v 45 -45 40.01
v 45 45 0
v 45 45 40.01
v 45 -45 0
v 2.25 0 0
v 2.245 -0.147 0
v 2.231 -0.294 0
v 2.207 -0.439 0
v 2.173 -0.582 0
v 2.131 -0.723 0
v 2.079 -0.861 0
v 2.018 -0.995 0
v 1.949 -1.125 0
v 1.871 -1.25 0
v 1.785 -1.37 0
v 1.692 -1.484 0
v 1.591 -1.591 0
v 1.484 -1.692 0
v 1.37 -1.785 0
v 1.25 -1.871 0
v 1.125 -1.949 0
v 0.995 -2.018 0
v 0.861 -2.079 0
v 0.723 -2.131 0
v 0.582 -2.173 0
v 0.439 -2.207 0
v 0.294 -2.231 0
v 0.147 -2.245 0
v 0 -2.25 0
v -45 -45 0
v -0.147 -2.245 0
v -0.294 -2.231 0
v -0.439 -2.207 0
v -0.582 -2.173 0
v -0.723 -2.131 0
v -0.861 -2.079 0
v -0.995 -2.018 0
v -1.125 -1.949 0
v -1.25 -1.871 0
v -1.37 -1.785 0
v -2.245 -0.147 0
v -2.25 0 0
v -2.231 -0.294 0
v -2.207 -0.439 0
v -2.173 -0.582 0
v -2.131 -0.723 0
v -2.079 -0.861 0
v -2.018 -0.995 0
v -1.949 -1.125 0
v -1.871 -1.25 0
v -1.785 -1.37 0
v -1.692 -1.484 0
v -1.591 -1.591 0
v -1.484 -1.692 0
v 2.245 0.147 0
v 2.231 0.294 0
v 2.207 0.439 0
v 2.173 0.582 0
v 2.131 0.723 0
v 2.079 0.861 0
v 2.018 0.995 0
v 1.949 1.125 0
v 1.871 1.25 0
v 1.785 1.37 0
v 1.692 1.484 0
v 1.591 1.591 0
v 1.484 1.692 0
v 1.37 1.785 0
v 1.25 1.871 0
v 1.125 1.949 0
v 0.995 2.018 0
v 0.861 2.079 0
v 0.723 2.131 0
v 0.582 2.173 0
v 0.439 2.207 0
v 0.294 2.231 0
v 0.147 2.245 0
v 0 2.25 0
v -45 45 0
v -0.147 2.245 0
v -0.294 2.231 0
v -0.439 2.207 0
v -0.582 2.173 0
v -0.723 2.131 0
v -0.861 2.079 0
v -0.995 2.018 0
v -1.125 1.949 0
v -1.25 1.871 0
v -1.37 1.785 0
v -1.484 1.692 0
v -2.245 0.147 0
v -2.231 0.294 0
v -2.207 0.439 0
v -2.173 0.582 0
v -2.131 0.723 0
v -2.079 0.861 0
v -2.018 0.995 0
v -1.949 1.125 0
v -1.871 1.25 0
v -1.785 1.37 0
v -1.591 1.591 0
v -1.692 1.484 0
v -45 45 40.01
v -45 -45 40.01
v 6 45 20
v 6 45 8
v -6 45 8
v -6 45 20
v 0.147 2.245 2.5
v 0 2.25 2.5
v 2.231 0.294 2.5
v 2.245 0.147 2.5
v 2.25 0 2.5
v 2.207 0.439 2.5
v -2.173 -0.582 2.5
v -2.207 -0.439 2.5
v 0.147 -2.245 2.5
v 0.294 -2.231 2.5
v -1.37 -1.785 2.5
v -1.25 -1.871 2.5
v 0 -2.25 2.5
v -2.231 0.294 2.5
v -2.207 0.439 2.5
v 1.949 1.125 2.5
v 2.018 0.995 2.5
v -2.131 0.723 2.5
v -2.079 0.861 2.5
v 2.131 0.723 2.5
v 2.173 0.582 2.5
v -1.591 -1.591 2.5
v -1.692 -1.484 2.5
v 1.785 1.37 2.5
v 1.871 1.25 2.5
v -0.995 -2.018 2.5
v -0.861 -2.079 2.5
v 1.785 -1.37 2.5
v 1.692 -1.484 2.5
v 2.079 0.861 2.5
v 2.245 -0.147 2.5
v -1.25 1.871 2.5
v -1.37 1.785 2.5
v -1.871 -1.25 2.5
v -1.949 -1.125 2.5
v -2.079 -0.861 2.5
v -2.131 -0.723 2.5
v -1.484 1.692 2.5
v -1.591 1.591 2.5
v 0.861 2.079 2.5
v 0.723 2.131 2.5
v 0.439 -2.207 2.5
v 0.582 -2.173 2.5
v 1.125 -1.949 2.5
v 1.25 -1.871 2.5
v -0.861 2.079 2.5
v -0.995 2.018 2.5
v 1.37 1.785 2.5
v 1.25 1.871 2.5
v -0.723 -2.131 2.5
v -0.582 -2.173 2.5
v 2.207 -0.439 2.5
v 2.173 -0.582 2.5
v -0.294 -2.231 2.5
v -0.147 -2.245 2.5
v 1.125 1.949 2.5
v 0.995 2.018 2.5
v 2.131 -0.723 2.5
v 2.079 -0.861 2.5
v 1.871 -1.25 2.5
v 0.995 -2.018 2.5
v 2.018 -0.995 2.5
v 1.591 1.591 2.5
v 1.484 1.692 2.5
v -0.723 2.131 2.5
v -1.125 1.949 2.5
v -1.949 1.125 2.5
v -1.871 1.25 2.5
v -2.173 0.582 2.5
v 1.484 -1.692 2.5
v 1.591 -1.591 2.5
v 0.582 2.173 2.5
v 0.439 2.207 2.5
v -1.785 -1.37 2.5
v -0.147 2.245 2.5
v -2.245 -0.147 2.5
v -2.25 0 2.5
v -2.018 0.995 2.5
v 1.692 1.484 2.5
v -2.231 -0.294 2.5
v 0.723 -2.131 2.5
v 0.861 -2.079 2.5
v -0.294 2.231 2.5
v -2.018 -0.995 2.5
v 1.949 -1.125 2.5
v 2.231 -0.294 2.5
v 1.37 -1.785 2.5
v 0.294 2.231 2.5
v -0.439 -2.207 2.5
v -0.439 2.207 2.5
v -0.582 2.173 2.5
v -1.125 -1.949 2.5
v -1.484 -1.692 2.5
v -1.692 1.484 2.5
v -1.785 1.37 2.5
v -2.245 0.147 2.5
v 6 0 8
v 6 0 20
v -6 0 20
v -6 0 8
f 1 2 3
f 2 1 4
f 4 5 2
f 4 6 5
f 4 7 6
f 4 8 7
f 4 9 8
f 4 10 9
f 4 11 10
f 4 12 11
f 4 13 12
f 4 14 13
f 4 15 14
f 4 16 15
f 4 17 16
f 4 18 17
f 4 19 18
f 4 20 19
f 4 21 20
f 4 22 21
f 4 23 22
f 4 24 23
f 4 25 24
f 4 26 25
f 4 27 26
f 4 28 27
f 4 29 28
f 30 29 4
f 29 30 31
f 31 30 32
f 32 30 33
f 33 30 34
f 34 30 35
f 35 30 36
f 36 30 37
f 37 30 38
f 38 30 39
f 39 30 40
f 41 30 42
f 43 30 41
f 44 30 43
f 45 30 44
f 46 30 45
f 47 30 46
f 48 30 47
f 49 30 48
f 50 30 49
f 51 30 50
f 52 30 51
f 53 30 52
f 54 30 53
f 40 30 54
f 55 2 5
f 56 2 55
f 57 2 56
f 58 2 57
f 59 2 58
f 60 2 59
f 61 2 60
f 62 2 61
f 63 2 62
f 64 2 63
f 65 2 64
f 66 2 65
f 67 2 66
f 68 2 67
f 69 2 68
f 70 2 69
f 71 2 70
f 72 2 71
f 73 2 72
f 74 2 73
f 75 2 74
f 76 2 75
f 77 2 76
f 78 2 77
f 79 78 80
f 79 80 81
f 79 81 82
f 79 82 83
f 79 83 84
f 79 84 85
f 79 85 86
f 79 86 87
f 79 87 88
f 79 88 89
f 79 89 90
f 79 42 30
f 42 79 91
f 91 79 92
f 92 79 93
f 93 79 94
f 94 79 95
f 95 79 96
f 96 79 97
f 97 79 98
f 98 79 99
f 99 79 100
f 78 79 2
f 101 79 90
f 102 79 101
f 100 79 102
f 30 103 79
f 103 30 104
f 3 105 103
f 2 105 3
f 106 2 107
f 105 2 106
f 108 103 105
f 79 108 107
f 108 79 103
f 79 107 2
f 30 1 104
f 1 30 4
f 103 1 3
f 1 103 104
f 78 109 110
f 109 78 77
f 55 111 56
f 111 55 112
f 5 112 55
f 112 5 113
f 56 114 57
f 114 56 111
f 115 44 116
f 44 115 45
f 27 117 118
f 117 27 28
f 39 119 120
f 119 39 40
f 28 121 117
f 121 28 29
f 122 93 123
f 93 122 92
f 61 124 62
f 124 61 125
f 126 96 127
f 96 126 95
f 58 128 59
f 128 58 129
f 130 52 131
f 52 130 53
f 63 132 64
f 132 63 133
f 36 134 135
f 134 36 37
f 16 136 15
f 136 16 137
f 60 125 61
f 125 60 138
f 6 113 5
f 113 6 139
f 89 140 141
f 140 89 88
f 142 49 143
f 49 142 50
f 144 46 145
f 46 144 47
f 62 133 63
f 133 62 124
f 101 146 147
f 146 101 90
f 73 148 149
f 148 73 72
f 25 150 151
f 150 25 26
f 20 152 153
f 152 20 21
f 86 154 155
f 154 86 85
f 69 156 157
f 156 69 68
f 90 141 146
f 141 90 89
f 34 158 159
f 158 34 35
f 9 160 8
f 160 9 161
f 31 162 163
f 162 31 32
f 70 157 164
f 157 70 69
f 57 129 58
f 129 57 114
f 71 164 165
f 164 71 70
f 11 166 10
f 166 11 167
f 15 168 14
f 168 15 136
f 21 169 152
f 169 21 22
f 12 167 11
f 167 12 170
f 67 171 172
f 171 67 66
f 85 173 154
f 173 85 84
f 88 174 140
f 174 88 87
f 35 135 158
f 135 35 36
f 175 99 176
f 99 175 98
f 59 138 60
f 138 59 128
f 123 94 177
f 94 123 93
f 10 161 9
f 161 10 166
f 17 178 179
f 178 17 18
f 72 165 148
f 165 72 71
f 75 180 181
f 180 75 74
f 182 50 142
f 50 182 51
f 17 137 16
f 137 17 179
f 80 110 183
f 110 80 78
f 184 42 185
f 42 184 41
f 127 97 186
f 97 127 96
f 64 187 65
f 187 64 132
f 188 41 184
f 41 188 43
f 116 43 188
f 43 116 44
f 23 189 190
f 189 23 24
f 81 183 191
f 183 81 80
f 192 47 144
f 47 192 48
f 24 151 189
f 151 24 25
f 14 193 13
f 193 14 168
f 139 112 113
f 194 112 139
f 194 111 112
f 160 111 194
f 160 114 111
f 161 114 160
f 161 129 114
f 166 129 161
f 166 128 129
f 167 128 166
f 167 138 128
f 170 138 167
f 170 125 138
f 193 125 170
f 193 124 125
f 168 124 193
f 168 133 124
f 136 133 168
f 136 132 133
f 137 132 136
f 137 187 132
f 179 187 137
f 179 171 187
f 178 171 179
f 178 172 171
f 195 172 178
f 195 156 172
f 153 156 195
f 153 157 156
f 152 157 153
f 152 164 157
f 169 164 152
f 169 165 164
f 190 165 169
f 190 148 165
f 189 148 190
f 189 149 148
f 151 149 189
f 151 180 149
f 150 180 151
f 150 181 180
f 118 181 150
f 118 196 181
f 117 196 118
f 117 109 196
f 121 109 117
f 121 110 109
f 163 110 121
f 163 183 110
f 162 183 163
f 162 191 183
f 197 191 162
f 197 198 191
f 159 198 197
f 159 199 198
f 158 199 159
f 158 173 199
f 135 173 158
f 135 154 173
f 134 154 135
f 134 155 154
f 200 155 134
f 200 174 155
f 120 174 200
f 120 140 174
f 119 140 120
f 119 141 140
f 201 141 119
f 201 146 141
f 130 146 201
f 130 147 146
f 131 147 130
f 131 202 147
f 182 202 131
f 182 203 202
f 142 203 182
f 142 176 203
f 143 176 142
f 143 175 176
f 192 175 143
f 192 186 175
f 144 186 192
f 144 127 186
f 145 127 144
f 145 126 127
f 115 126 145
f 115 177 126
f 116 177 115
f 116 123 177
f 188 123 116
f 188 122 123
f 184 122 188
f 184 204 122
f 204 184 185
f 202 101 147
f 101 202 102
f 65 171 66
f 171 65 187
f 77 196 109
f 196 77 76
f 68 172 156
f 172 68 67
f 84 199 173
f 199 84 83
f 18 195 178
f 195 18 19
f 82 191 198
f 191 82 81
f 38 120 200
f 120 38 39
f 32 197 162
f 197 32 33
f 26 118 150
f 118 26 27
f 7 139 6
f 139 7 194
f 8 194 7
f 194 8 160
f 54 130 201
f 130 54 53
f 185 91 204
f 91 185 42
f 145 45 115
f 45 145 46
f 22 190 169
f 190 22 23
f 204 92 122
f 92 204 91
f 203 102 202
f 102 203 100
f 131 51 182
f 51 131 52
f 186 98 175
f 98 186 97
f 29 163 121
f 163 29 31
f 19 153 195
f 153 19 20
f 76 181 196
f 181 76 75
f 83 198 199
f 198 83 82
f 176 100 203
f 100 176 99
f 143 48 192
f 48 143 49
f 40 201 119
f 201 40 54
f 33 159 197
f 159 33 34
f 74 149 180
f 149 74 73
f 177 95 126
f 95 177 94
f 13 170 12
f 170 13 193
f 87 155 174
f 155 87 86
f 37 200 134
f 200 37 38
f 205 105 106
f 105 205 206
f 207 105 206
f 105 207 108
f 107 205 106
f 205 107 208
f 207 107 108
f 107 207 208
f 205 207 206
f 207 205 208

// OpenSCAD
// Magnetic stirrer housing - open box covering an 80 mm PC case fan
// Print orientation: top plate on bed (z = 0), walls rise to open top (z = 40)

// ---------- Parameters ----------
outer_x      = 90;    // outer size in X (mm)
outer_y      = 90;    // outer size in Y (mm)
plate_t      = 2;     // top plate thickness (mm)
wall_t       = 2.5;   // wall thickness (mm)
open_top_z   = 40;    // height of open top / wall tops (mm)
screw_holes  = 4;     // number of M4 screw holes
screw_d      = 4.5;   // screw hole diameter (mm)
screw_pitch  = 71.5;  // square pattern size for screw holes (mm)
notch_w      = 12;    // power cable notch width (mm)
notch_bottom = 8;     // notch depth from open edge (mm), z = 32..40

eps          = 0.5;   // cutter overshoot past faces (mm)
$fn          = 96;    // curve resolution

// ---------- Model ----------
difference() {
    // Solid block: top plate + four walls
    union() {
        // Top plate (lies on bed in print orientation)
        translate([-outer_x/2, -outer_y/2, 0])
            cube([outer_x, outer_y, plate_t]);

        // Inner hollow, open at the top (from z = plate_t up to open_top_z)
        translate([-outer_x/2, -outer_y/2, plate_t])
            cube([outer_x, outer_y, open_top_z - plate_t + 0.01]);
    }

    // Screw holes through the top plate, centred on the plate
    for (i = [0 : screw_holes - 1]) {
        rotate([0, 0, i * 360 / screw_holes])
            translate([0, 0, -eps])
                cylinder(d = screw_d, h = plate_t + 2 * eps);
    }

    // Cable notch in one wall: centred along the wall, z = 32..40
    translate([-outer_x/2 + (outer_y - notch_w)/2, 0, notch_bottom])
        cube([notch_w, outer_y, notch_w]);  // square notch, w x h = 12 x 12
}
